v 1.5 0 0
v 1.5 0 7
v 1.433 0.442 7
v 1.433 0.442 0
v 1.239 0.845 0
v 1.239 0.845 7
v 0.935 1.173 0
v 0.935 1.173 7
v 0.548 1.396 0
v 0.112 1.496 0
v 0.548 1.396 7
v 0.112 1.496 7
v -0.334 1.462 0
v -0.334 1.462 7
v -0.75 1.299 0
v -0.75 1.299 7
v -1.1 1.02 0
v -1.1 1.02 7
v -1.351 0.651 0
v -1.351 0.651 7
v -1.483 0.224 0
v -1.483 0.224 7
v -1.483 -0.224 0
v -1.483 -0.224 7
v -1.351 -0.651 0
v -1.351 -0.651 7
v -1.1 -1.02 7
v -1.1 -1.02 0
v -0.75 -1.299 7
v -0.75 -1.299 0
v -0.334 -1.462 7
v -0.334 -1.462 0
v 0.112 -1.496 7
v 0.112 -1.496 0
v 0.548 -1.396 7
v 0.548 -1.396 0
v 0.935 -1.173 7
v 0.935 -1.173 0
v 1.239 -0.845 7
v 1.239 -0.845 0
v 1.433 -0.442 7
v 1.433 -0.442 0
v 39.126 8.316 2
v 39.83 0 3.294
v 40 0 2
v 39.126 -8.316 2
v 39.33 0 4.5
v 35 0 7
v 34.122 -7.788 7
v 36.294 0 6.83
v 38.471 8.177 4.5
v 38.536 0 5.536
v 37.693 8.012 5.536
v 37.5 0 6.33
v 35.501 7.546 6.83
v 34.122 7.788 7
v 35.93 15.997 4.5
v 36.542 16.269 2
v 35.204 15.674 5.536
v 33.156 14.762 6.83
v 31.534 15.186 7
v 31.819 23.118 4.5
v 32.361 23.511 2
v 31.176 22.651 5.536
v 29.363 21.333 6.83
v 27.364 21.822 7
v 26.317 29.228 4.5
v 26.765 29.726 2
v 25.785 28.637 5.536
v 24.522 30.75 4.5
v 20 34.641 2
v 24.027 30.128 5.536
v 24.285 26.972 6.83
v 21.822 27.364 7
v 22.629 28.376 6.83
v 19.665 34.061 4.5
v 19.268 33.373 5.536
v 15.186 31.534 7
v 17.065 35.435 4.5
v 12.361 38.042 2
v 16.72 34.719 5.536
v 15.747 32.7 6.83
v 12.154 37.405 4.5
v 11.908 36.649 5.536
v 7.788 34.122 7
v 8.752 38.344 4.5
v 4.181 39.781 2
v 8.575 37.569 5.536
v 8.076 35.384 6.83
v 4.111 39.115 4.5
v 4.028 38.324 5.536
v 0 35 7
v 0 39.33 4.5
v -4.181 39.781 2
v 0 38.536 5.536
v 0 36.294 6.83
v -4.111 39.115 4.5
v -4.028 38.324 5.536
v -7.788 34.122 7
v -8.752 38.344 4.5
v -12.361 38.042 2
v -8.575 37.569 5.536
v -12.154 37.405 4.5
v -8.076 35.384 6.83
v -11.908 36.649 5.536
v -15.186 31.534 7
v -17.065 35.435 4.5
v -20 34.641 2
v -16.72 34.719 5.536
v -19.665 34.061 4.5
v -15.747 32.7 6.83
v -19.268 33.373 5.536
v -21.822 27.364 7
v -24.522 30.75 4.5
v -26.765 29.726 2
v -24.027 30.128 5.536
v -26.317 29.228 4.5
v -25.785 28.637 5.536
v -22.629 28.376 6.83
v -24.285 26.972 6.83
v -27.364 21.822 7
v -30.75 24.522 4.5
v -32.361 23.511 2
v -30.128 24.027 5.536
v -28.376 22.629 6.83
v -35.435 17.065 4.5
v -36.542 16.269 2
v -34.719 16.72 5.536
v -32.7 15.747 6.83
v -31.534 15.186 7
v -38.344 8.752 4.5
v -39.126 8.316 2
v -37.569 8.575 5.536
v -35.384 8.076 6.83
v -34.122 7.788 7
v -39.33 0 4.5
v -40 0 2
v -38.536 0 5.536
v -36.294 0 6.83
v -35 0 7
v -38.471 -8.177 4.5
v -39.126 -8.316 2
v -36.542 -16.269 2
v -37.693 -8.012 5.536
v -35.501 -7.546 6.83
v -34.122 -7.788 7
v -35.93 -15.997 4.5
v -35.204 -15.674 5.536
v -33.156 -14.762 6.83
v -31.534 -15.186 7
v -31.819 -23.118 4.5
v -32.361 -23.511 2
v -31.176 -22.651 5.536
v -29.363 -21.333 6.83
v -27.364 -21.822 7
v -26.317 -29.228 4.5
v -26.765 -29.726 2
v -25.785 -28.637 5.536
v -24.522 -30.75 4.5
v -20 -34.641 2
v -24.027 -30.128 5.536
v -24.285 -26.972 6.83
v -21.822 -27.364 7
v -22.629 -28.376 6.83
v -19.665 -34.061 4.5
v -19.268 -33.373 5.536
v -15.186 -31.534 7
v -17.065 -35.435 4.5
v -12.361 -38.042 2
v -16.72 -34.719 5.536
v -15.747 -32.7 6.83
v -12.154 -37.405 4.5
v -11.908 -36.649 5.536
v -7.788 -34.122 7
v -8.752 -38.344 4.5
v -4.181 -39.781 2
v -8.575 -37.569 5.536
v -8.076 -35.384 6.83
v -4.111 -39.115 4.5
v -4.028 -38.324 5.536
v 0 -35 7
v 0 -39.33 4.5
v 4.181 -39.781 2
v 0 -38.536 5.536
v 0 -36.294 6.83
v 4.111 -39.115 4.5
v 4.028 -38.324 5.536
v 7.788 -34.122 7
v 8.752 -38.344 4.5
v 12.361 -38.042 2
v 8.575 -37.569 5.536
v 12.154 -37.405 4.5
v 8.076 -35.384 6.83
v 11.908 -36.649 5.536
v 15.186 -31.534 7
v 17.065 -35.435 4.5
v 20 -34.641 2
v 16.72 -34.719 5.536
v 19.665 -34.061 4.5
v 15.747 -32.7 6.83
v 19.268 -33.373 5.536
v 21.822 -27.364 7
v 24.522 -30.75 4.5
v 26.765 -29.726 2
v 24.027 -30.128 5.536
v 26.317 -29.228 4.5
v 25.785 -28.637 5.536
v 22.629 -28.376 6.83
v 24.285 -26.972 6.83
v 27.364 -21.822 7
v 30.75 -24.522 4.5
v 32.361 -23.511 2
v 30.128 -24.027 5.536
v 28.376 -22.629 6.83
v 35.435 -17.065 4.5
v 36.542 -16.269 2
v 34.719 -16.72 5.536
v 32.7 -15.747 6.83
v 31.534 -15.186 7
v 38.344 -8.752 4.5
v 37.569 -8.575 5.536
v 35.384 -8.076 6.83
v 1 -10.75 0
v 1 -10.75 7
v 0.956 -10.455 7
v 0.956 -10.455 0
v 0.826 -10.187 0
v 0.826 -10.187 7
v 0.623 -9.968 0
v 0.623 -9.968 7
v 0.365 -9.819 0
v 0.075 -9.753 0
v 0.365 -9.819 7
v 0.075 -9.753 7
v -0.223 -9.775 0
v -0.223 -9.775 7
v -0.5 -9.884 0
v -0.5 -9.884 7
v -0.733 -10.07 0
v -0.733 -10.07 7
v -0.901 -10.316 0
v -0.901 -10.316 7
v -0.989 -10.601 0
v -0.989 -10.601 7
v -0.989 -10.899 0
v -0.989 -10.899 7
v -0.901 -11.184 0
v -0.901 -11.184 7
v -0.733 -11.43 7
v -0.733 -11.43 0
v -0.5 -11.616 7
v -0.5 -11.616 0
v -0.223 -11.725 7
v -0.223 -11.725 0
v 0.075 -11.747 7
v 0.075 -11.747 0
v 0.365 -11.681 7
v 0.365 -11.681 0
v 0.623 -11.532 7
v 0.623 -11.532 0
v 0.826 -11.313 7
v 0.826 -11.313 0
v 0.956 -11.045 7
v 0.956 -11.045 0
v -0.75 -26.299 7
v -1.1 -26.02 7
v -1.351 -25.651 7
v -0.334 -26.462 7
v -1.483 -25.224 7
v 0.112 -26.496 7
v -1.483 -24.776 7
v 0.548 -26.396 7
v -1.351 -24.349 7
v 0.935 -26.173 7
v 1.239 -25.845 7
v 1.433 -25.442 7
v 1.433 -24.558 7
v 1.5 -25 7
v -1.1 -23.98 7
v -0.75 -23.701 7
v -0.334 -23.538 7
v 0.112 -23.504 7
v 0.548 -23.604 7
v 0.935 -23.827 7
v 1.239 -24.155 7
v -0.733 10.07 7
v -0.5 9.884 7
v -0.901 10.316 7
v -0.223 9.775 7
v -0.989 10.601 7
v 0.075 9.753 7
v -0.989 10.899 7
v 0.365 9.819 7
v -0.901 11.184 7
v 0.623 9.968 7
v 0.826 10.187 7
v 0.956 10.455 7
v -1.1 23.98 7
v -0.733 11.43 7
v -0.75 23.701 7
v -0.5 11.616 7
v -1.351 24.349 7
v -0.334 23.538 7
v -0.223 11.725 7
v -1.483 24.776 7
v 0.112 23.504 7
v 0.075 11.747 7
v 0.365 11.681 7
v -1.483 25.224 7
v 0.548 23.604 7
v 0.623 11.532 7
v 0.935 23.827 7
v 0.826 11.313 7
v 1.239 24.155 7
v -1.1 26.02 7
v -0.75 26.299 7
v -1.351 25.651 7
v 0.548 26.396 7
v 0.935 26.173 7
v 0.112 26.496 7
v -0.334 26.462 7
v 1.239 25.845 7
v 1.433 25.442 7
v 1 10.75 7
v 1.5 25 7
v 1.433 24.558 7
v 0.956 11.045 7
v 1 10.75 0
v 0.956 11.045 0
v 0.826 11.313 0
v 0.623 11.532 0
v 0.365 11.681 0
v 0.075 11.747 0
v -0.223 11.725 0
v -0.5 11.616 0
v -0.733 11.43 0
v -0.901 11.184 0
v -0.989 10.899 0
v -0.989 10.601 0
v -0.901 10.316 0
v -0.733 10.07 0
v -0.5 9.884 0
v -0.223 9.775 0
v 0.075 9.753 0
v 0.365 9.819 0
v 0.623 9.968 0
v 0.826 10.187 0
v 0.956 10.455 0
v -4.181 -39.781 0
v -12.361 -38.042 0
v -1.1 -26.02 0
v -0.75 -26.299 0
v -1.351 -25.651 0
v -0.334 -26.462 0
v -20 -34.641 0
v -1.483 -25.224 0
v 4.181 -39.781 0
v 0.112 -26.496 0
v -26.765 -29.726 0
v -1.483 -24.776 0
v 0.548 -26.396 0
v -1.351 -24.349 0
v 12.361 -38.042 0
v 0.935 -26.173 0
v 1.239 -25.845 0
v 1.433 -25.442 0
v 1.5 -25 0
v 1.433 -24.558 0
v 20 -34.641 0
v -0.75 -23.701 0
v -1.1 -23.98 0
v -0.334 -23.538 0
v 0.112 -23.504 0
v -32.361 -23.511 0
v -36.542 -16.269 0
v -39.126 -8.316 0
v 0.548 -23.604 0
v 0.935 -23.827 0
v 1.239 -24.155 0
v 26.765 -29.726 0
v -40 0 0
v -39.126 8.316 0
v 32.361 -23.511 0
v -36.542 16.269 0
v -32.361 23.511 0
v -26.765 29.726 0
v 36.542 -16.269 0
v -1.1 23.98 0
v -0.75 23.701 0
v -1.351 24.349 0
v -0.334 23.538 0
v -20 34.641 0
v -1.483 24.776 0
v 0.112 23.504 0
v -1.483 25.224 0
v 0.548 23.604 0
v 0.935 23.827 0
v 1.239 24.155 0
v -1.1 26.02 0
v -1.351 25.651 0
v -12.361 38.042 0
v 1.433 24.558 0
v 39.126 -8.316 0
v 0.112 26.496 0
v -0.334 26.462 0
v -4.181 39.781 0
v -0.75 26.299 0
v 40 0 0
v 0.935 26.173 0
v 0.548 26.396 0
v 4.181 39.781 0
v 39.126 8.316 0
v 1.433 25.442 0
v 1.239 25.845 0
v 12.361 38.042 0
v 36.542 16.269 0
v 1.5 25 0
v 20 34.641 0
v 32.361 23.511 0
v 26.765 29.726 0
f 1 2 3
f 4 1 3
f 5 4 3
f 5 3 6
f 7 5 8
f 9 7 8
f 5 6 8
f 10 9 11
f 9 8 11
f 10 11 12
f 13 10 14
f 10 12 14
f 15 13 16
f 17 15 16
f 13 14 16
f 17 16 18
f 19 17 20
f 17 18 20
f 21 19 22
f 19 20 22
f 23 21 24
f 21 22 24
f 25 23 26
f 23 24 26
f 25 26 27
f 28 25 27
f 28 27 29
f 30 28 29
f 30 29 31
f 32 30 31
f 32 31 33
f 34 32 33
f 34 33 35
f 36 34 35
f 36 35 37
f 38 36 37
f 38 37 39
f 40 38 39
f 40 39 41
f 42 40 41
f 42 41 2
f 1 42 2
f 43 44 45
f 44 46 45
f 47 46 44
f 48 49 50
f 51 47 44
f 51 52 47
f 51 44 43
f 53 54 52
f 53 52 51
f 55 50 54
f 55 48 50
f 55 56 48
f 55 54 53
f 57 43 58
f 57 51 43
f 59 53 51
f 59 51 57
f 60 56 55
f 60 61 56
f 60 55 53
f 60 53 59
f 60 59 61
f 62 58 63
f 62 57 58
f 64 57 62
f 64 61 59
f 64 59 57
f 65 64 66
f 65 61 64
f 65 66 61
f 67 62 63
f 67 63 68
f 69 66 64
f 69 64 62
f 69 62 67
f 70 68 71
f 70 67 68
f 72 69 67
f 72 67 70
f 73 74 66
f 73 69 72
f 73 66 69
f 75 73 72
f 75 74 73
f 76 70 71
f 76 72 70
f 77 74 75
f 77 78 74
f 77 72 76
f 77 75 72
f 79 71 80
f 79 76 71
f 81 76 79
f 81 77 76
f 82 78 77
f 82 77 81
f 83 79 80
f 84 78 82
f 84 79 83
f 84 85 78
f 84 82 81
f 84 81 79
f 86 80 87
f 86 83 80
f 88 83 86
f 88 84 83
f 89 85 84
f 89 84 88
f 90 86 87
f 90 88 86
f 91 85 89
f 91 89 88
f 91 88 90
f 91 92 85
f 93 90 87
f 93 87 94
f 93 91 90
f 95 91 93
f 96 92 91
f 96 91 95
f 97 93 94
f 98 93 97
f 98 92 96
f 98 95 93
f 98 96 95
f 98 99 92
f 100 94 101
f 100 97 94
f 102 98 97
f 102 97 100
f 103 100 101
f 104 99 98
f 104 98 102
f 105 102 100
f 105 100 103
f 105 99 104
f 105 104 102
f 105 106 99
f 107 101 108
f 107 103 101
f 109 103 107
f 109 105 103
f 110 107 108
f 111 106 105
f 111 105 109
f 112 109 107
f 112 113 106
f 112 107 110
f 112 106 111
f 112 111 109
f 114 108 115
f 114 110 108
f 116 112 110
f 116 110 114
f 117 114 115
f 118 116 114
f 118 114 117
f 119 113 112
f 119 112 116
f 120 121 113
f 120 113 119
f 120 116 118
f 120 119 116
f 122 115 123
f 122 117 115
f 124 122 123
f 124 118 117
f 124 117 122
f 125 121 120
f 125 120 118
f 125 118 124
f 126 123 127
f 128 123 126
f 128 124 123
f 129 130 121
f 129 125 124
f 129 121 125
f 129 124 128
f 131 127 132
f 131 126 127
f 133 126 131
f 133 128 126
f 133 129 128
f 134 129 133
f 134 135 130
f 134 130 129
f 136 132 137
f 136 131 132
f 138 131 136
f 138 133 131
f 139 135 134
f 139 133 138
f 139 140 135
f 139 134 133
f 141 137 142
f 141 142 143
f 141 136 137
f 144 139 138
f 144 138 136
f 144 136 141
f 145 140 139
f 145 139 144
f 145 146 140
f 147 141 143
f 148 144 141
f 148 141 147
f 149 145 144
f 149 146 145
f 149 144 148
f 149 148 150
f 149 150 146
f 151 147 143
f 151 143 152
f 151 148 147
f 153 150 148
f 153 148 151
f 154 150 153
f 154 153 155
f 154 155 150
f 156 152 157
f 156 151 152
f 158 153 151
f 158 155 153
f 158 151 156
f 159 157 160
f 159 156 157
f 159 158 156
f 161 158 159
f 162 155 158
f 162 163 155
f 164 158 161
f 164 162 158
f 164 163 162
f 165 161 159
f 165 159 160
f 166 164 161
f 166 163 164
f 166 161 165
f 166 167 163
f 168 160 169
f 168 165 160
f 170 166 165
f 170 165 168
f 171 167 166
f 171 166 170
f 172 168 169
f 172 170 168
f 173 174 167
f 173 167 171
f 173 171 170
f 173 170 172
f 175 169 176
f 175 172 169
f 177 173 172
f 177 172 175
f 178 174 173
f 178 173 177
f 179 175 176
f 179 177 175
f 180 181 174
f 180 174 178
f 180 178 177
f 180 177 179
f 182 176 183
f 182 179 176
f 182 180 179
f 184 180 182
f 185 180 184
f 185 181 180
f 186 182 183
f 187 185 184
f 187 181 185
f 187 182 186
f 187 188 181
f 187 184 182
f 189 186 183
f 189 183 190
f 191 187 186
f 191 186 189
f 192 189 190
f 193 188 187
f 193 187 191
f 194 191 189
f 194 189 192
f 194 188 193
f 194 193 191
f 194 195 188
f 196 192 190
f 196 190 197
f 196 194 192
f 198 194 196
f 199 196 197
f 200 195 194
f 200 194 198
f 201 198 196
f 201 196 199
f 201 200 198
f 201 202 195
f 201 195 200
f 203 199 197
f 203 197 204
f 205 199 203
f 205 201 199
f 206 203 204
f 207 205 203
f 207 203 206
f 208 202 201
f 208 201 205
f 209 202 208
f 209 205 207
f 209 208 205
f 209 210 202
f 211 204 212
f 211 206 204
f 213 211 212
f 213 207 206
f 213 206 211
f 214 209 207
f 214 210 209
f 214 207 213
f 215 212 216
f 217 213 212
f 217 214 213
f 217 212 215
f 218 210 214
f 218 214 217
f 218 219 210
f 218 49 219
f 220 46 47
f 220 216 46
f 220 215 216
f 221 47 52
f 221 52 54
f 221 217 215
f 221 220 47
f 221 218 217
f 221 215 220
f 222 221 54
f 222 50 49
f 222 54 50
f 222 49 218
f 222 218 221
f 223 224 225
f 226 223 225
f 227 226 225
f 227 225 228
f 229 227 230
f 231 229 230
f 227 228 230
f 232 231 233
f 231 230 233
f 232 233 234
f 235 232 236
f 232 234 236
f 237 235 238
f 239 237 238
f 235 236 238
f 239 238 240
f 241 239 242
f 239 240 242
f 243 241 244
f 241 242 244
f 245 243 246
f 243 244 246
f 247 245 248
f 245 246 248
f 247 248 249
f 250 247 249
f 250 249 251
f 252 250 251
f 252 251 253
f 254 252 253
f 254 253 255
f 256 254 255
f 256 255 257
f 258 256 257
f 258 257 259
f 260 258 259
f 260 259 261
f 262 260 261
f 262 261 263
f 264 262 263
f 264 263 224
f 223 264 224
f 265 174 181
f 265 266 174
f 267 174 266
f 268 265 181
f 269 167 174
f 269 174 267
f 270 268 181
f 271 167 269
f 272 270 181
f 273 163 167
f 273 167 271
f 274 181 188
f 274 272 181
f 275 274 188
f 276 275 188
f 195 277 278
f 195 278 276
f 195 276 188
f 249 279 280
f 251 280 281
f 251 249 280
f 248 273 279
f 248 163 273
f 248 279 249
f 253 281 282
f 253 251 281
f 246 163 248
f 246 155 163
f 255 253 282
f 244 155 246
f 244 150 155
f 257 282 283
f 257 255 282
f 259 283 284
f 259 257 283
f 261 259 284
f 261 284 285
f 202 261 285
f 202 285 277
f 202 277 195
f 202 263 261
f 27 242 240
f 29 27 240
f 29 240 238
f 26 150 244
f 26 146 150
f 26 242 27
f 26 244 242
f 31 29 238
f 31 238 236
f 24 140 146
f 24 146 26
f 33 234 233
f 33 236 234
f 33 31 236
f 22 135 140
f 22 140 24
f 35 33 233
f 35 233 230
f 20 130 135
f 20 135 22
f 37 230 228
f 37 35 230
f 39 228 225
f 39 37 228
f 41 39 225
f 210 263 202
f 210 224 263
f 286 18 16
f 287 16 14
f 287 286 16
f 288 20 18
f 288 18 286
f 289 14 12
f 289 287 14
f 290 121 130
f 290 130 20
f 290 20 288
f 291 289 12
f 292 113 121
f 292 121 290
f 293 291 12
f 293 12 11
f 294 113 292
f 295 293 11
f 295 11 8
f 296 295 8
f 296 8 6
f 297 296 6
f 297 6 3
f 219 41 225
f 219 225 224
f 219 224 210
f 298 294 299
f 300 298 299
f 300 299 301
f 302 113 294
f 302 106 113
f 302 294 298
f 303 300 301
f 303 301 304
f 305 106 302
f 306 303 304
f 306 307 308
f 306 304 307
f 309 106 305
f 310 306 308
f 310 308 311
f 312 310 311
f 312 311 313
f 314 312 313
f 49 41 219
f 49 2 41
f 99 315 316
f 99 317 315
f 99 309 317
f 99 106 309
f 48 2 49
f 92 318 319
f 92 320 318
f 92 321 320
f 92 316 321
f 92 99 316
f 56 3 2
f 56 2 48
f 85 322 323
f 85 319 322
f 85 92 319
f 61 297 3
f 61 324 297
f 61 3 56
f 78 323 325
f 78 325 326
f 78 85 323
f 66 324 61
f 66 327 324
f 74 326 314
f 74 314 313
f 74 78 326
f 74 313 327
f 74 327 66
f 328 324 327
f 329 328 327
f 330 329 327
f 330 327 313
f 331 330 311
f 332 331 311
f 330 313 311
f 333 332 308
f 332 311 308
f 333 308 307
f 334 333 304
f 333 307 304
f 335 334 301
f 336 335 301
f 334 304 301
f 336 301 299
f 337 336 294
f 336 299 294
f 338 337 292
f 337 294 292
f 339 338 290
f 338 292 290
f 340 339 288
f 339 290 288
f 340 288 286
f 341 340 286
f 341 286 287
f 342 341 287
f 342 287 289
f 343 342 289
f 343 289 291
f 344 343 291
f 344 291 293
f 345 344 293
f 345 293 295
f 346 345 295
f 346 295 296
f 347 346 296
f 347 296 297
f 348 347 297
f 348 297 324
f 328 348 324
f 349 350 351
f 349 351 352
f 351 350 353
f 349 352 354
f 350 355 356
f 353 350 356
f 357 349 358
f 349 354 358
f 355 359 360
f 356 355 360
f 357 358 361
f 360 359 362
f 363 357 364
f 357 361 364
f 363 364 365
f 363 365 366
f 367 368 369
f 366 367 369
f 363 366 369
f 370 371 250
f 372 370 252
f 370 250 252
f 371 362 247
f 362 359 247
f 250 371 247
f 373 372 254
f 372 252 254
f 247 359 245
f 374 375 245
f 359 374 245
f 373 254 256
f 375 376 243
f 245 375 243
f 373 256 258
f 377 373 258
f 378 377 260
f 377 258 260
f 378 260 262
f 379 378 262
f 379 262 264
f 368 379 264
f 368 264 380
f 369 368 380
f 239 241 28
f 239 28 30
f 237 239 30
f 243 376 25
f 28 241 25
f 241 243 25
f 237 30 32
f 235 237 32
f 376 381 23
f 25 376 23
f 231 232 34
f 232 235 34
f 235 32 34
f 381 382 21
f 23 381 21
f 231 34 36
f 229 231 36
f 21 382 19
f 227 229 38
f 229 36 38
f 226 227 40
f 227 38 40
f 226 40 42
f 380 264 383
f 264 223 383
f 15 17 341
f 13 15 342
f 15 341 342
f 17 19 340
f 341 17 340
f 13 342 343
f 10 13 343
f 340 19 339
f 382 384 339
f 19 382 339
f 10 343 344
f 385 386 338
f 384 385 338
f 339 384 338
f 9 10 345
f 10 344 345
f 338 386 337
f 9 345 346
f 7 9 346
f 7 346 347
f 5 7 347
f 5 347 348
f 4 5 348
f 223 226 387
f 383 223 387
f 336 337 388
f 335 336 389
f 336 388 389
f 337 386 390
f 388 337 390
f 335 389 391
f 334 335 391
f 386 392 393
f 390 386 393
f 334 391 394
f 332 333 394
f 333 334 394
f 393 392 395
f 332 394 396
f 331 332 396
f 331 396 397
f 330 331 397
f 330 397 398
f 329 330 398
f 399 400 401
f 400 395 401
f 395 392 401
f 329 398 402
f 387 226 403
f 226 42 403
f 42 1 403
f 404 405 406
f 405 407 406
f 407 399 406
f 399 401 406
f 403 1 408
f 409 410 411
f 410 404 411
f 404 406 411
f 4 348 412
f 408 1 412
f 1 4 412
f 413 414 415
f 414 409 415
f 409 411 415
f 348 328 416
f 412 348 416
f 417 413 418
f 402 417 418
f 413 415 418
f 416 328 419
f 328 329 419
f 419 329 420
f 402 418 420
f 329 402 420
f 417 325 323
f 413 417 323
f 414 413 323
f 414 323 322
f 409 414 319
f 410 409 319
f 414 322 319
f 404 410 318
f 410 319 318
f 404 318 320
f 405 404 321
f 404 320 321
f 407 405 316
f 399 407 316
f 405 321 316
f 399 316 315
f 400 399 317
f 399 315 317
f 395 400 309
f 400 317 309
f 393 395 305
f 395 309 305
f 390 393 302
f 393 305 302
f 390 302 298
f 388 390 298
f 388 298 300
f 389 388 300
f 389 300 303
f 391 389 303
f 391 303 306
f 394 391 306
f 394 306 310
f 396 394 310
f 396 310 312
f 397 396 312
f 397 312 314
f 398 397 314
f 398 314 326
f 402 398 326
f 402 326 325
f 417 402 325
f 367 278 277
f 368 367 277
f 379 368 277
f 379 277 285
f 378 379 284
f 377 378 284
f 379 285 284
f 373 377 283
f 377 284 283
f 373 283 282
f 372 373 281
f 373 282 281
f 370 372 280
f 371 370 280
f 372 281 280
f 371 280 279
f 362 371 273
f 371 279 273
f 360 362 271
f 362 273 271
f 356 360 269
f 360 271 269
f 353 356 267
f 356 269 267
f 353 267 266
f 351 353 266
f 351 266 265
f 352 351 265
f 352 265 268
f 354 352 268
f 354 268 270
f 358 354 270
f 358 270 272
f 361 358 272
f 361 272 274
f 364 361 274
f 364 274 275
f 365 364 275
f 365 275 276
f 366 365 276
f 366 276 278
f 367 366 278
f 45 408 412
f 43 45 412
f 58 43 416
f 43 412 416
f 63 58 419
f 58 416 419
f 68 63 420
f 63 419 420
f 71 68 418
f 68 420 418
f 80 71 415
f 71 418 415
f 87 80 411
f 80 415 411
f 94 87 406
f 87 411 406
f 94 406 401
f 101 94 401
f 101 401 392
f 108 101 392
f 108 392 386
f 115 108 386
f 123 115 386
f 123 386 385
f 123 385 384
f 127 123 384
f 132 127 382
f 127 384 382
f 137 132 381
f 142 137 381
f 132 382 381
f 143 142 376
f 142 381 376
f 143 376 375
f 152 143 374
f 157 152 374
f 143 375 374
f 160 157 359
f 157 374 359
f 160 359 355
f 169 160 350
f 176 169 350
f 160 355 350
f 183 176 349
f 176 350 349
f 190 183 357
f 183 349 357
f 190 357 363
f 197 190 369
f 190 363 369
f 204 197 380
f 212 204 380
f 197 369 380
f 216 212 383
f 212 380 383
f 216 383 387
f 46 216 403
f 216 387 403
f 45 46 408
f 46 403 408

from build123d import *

# Parameters (mm, degrees)
SCHIZZO1_R                   = 40
ESTRUSIONE_ESTRUSIONE1_DEPTH = 7
RACCORDO1_R                  = 5
SCHIZZO2_R                   = 1.5
TAGLIO_ESTRUSIONE1_DEPTH     = 37
SCHIZZO3_R                   = 1
TAGLIO_ESTRUSIONE2_DEPTH     = 10
SCHIZZO4_R                   = 1.5
TAGLIO_ESTRUSIONE3_DEPTH     = 10


with BuildPart() as part:
    # Schizzo1 → Estrusione-Estrusione1 (new body)
    with BuildSketch(Plane.XY):
        Circle(SCHIZZO1_R)
    extrude(amount=ESTRUSIONE_ESTRUSIONE1_DEPTH)

    # Raccordo1
    raccordo1_edges = [part.edges().sort_by_distance(p)[0] for p in [
        (-40, 0, 7),
    ]]
    fillet(raccordo1_edges, radius=RACCORDO1_R)

    # Schizzo2 → Taglio-Estrusione1 (cut)
    with BuildSketch(Plane.XY.offset(7)):
        with Locations((0, 25)):
            Circle(SCHIZZO2_R)
        with Locations((0, -25)):
            Circle(SCHIZZO2_R)
    extrude(amount=-TAGLIO_ESTRUSIONE1_DEPTH, mode=Mode.SUBTRACT)

    # Schizzo3 → Taglio-Estrusione2 (cut)
    with BuildSketch(Plane.XY.offset(7)):
        with Locations((0, 10.75)):
            Circle(SCHIZZO3_R)
        with Locations((0, -10.75)):
            Circle(SCHIZZO3_R)
    extrude(amount=-TAGLIO_ESTRUSIONE2_DEPTH, mode=Mode.SUBTRACT)

    # Schizzo4 → Taglio-Estrusione3 (cut)
    with BuildSketch(Plane.XY.offset(7)):
        Circle(SCHIZZO4_R)
    extrude(amount=-TAGLIO_ESTRUSIONE3_DEPTH, mode=Mode.SUBTRACT)


solid = part.part
